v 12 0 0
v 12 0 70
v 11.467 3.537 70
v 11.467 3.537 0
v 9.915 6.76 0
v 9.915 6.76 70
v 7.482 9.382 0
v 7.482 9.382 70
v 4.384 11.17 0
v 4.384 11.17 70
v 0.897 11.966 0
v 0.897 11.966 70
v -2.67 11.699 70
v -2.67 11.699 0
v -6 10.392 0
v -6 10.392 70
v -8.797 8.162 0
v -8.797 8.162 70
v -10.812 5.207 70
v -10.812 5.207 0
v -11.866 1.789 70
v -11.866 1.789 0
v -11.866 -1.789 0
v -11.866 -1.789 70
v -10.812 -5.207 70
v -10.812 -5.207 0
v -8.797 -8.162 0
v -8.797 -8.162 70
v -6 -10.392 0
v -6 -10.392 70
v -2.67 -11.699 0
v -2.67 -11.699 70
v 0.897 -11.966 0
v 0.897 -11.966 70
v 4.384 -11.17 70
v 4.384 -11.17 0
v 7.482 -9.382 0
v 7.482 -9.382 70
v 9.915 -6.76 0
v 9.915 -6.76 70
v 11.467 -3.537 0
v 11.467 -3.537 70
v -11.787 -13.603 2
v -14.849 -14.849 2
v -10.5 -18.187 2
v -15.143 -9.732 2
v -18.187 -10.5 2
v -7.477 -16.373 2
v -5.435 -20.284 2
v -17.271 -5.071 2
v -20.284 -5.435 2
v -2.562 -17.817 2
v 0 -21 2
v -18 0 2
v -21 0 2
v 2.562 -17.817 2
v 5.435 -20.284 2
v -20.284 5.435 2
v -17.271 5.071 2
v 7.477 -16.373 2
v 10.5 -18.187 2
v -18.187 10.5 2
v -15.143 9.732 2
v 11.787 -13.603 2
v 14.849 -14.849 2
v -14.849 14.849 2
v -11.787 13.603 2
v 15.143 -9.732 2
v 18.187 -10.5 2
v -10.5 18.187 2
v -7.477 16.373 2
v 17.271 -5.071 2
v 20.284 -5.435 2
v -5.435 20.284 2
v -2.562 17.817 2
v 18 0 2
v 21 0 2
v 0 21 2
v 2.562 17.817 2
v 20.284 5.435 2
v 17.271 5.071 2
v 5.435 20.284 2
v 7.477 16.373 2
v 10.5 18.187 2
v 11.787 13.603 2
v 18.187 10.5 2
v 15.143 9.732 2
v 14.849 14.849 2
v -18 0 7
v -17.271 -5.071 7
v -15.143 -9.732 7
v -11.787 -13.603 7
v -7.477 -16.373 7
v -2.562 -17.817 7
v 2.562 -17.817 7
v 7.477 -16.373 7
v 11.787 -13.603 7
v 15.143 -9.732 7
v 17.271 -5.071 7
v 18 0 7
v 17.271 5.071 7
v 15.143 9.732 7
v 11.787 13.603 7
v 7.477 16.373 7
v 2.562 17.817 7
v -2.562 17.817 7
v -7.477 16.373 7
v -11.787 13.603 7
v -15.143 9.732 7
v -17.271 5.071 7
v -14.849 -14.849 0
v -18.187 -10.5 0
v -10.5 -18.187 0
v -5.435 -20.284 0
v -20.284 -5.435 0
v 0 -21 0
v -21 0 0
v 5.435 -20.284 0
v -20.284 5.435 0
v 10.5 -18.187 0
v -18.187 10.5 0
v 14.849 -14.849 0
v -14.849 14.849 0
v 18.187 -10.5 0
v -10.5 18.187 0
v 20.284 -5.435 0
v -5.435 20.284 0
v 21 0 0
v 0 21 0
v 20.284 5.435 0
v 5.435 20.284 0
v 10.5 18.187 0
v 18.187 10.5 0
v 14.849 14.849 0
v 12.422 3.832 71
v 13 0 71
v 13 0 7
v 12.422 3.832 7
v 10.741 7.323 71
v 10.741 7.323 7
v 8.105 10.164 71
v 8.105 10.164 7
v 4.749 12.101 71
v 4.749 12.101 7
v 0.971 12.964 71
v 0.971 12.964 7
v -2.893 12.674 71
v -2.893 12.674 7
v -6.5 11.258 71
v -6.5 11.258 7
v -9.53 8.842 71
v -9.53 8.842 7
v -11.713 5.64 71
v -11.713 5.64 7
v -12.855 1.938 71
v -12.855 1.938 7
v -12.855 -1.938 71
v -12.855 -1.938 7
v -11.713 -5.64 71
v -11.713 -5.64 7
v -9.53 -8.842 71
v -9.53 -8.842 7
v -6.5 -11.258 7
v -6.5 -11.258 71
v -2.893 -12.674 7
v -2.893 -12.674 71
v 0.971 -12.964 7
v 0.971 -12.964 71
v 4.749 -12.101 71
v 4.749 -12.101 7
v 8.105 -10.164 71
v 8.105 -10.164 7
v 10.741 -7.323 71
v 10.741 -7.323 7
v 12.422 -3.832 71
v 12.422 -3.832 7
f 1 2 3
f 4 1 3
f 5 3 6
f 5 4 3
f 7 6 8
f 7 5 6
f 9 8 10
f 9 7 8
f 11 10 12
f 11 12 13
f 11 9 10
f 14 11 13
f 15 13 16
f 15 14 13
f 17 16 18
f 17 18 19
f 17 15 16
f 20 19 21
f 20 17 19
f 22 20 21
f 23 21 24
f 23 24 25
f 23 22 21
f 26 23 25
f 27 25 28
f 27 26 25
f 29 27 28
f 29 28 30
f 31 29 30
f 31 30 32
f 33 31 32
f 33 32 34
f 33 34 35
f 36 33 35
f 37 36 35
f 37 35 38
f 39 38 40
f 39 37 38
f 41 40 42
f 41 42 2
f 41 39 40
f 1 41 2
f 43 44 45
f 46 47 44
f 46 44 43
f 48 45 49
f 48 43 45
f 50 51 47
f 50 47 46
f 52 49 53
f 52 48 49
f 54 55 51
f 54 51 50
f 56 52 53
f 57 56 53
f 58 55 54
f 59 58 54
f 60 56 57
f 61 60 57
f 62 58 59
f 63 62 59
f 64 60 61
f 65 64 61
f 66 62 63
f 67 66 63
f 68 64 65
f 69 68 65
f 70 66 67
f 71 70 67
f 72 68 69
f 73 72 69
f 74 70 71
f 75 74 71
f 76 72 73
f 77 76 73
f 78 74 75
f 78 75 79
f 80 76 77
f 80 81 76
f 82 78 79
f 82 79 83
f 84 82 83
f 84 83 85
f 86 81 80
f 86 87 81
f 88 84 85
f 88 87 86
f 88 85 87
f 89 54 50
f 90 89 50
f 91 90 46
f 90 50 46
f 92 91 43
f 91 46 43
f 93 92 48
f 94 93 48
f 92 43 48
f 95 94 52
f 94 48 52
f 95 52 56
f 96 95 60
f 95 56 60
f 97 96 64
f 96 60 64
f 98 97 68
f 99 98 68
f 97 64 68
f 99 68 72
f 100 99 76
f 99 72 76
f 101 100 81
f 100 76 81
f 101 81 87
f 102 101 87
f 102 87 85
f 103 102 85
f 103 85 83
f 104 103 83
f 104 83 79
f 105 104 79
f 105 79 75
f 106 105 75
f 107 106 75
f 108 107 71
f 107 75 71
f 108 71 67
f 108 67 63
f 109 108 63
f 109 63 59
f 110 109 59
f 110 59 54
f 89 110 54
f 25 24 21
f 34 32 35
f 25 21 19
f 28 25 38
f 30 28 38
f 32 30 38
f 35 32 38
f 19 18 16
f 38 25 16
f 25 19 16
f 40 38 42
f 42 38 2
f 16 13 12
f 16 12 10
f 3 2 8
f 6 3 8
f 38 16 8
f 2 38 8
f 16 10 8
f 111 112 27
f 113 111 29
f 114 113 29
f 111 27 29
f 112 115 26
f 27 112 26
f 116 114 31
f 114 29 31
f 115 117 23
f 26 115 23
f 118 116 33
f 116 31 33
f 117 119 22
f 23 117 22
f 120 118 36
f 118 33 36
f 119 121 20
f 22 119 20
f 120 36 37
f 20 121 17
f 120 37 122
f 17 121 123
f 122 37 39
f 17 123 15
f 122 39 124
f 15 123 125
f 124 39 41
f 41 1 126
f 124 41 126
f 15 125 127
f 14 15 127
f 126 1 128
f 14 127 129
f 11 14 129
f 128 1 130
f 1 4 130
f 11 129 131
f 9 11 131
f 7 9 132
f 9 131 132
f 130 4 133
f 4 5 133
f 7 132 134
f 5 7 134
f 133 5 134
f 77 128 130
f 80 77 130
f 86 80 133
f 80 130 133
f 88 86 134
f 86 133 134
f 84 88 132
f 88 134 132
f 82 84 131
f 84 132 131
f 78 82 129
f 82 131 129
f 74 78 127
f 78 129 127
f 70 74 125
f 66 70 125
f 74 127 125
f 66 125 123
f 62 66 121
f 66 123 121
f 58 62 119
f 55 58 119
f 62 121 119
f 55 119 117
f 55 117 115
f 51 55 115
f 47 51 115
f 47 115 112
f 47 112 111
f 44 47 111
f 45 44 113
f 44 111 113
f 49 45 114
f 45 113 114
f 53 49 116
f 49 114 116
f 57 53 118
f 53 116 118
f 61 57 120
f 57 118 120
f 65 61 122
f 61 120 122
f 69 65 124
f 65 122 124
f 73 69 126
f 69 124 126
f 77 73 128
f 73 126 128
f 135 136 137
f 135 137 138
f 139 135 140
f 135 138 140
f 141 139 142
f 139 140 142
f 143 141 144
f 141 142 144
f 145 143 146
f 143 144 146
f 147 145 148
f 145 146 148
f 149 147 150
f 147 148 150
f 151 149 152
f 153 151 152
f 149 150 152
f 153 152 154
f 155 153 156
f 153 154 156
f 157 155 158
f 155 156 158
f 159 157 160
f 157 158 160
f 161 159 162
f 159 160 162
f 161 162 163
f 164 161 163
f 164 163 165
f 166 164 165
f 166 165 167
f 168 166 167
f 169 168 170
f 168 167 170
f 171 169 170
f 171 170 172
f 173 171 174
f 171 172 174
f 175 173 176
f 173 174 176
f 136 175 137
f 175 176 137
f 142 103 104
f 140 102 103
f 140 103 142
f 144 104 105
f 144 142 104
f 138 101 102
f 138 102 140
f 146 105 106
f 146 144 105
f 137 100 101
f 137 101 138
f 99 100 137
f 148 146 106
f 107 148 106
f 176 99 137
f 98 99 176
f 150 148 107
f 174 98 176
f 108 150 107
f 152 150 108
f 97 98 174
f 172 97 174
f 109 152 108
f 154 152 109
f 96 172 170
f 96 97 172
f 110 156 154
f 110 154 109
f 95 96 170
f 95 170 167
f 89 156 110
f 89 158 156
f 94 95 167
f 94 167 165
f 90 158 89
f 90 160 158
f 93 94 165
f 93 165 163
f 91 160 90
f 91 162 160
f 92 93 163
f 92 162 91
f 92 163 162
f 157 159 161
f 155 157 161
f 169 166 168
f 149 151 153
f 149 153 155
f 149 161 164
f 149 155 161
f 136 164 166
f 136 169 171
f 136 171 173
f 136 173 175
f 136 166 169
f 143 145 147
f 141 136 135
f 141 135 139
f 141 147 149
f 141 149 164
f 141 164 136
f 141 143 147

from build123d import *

# Parameters (mm, degrees)
SKETCH2_R           = 13
SKETCH2_R_2         = 12
BOSS_EXTRUDE1_DEPTH = 70
SKETCH2_3_R         = 18
SKETCH2_3_R_2       = 13
BOSS_EXTRUDE2_DEPTH = 7
SKETCH2_4_R         = 21
SKETCH2_4_R_2       = 18
BOSS_EXTRUDE3_DEPTH = 2
SKETCH3_R           = 13
BOSS_EXTRUDE4_DEPTH = 1


with BuildPart() as part:
    # Sketch2 → Boss-Extrude1 (new body)
    with BuildSketch(Plane.XY):
        Circle(SKETCH2_R)
        Circle(SKETCH2_R_2, mode=Mode.SUBTRACT)
    extrude(amount=BOSS_EXTRUDE1_DEPTH)

    # Sketch2<3> → Boss-Extrude2 (add)
    with BuildSketch(Plane.XY):
        Circle(SKETCH2_3_R)
        Circle(SKETCH2_3_R_2, mode=Mode.SUBTRACT)
    extrude(amount=BOSS_EXTRUDE2_DEPTH)

    # Sketch2<4> → Boss-Extrude3 (add)
    with BuildSketch(Plane.XY):
        Circle(SKETCH2_4_R)
        Circle(SKETCH2_4_R_2, mode=Mode.SUBTRACT)
    extrude(amount=BOSS_EXTRUDE3_DEPTH)

    # Sketch3 → Boss-Extrude4 (add)
    with BuildSketch(Plane.XY.offset(70)):
        Circle(SKETCH3_R)
    extrude(amount=BOSS_EXTRUDE4_DEPTH)


solid = part.part
